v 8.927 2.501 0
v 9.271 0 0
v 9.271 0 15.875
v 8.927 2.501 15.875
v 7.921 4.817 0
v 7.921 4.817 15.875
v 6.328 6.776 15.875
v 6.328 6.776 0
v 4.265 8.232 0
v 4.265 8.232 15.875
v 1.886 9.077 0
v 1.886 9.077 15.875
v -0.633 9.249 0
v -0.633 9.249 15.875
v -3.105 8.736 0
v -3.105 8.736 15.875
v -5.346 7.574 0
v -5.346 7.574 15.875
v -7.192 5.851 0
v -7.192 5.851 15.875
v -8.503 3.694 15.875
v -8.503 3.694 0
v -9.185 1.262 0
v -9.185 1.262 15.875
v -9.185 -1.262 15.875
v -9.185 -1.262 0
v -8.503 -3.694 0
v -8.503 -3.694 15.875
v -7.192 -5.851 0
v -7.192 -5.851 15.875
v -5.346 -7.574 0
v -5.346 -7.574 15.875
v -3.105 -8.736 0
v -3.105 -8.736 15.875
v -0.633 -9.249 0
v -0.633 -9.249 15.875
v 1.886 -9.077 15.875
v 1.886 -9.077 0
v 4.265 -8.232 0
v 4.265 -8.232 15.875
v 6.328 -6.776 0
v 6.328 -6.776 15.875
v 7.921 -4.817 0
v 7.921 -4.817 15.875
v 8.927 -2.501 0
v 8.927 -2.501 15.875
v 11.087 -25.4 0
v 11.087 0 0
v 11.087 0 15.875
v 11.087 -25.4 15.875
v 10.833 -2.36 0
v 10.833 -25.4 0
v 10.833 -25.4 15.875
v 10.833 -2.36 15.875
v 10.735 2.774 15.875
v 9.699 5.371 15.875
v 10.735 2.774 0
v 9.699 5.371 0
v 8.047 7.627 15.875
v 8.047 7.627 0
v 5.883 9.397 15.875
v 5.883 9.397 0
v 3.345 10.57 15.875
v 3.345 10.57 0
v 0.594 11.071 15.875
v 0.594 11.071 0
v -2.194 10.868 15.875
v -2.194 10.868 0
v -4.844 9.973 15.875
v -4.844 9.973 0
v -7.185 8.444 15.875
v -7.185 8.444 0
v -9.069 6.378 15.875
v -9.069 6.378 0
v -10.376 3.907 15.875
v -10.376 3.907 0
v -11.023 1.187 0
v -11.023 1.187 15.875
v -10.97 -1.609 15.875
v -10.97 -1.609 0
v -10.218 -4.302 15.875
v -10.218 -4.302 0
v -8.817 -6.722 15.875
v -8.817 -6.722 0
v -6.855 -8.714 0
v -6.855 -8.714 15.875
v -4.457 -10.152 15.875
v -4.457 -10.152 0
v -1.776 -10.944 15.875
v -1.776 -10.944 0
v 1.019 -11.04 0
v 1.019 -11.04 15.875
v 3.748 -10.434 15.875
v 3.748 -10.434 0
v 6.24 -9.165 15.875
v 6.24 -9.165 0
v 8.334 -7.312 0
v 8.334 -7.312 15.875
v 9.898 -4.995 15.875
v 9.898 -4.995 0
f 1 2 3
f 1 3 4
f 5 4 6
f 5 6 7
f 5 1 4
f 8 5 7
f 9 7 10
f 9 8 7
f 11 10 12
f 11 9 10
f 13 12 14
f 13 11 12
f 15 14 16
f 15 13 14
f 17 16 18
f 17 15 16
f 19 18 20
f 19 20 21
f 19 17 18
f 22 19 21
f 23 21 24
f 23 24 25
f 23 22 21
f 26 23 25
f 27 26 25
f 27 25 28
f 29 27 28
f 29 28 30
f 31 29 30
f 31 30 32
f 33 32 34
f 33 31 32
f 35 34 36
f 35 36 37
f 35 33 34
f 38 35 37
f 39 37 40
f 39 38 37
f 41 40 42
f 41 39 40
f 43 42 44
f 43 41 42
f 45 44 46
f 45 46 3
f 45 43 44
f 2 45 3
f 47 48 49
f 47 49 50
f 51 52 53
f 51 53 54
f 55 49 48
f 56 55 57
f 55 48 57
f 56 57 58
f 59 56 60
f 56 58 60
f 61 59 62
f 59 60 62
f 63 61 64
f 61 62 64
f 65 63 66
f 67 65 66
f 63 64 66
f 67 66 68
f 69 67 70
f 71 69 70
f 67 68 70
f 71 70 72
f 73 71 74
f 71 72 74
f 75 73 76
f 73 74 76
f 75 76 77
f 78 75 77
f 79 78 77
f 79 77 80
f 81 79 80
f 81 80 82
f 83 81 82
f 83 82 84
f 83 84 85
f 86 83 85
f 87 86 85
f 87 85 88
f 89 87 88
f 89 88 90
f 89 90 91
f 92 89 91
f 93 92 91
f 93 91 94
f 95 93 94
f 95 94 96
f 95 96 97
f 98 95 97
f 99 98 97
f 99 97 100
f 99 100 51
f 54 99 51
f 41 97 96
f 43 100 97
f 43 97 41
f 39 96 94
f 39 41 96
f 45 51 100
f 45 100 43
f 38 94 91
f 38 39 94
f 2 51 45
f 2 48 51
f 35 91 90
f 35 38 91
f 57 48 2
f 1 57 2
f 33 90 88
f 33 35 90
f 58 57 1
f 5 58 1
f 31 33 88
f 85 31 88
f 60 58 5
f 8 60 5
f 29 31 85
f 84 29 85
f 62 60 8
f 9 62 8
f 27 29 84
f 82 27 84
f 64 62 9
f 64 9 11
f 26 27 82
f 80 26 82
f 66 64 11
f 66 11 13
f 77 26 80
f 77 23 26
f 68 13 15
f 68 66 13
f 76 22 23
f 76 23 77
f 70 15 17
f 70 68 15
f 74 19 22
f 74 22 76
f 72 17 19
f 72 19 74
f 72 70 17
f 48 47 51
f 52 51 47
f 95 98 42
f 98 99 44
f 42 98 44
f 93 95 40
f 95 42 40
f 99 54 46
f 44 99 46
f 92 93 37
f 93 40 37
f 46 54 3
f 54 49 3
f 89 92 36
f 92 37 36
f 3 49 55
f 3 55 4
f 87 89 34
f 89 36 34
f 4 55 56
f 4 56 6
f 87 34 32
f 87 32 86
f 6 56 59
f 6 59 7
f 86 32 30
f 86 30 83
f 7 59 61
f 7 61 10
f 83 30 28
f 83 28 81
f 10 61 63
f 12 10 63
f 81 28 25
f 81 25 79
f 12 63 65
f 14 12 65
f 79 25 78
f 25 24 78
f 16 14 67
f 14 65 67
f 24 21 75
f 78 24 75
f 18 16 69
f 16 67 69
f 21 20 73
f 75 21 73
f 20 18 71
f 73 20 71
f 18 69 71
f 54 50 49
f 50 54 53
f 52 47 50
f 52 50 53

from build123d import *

# Parameters (mm, degrees)
SKETCH1_R           = 11.0871
SKETCH1_R_2         = 9.271
BOSS_EXTRUDE1_DEPTH = 15.875
BOSS_EXTRUDE2_START = -15.875
BOSS_EXTRUDE2_DEPTH = 15.875


with BuildPart() as part:
    # Sketch1 → Boss-Extrude1 (new body)
    with BuildSketch(Plane.XY):
        Circle(SKETCH1_R)
        Circle(SKETCH1_R_2, mode=Mode.SUBTRACT)
    extrude(amount=BOSS_EXTRUDE1_DEPTH)

    # Sketch2 → Boss-Extrude2 (add)
    with BuildSketch(Plane.XY.offset(15.875).offset(BOSS_EXTRUDE2_START)):
        with BuildLine():
            Line((11.0871, 0), (11.0871, -25.4))
            Line((11.0871, -25.4), (10.8331, -25.4))
            Line((10.8331, -25.4), (10.8331, -2.35960395))
            ThreePointArc((10.8331, -2.35960395), (11.023417107, -1.186617756), (11.0871, 0))
        make_face()
    extrude(amount=BOSS_EXTRUDE2_DEPTH)


solid = part.part
